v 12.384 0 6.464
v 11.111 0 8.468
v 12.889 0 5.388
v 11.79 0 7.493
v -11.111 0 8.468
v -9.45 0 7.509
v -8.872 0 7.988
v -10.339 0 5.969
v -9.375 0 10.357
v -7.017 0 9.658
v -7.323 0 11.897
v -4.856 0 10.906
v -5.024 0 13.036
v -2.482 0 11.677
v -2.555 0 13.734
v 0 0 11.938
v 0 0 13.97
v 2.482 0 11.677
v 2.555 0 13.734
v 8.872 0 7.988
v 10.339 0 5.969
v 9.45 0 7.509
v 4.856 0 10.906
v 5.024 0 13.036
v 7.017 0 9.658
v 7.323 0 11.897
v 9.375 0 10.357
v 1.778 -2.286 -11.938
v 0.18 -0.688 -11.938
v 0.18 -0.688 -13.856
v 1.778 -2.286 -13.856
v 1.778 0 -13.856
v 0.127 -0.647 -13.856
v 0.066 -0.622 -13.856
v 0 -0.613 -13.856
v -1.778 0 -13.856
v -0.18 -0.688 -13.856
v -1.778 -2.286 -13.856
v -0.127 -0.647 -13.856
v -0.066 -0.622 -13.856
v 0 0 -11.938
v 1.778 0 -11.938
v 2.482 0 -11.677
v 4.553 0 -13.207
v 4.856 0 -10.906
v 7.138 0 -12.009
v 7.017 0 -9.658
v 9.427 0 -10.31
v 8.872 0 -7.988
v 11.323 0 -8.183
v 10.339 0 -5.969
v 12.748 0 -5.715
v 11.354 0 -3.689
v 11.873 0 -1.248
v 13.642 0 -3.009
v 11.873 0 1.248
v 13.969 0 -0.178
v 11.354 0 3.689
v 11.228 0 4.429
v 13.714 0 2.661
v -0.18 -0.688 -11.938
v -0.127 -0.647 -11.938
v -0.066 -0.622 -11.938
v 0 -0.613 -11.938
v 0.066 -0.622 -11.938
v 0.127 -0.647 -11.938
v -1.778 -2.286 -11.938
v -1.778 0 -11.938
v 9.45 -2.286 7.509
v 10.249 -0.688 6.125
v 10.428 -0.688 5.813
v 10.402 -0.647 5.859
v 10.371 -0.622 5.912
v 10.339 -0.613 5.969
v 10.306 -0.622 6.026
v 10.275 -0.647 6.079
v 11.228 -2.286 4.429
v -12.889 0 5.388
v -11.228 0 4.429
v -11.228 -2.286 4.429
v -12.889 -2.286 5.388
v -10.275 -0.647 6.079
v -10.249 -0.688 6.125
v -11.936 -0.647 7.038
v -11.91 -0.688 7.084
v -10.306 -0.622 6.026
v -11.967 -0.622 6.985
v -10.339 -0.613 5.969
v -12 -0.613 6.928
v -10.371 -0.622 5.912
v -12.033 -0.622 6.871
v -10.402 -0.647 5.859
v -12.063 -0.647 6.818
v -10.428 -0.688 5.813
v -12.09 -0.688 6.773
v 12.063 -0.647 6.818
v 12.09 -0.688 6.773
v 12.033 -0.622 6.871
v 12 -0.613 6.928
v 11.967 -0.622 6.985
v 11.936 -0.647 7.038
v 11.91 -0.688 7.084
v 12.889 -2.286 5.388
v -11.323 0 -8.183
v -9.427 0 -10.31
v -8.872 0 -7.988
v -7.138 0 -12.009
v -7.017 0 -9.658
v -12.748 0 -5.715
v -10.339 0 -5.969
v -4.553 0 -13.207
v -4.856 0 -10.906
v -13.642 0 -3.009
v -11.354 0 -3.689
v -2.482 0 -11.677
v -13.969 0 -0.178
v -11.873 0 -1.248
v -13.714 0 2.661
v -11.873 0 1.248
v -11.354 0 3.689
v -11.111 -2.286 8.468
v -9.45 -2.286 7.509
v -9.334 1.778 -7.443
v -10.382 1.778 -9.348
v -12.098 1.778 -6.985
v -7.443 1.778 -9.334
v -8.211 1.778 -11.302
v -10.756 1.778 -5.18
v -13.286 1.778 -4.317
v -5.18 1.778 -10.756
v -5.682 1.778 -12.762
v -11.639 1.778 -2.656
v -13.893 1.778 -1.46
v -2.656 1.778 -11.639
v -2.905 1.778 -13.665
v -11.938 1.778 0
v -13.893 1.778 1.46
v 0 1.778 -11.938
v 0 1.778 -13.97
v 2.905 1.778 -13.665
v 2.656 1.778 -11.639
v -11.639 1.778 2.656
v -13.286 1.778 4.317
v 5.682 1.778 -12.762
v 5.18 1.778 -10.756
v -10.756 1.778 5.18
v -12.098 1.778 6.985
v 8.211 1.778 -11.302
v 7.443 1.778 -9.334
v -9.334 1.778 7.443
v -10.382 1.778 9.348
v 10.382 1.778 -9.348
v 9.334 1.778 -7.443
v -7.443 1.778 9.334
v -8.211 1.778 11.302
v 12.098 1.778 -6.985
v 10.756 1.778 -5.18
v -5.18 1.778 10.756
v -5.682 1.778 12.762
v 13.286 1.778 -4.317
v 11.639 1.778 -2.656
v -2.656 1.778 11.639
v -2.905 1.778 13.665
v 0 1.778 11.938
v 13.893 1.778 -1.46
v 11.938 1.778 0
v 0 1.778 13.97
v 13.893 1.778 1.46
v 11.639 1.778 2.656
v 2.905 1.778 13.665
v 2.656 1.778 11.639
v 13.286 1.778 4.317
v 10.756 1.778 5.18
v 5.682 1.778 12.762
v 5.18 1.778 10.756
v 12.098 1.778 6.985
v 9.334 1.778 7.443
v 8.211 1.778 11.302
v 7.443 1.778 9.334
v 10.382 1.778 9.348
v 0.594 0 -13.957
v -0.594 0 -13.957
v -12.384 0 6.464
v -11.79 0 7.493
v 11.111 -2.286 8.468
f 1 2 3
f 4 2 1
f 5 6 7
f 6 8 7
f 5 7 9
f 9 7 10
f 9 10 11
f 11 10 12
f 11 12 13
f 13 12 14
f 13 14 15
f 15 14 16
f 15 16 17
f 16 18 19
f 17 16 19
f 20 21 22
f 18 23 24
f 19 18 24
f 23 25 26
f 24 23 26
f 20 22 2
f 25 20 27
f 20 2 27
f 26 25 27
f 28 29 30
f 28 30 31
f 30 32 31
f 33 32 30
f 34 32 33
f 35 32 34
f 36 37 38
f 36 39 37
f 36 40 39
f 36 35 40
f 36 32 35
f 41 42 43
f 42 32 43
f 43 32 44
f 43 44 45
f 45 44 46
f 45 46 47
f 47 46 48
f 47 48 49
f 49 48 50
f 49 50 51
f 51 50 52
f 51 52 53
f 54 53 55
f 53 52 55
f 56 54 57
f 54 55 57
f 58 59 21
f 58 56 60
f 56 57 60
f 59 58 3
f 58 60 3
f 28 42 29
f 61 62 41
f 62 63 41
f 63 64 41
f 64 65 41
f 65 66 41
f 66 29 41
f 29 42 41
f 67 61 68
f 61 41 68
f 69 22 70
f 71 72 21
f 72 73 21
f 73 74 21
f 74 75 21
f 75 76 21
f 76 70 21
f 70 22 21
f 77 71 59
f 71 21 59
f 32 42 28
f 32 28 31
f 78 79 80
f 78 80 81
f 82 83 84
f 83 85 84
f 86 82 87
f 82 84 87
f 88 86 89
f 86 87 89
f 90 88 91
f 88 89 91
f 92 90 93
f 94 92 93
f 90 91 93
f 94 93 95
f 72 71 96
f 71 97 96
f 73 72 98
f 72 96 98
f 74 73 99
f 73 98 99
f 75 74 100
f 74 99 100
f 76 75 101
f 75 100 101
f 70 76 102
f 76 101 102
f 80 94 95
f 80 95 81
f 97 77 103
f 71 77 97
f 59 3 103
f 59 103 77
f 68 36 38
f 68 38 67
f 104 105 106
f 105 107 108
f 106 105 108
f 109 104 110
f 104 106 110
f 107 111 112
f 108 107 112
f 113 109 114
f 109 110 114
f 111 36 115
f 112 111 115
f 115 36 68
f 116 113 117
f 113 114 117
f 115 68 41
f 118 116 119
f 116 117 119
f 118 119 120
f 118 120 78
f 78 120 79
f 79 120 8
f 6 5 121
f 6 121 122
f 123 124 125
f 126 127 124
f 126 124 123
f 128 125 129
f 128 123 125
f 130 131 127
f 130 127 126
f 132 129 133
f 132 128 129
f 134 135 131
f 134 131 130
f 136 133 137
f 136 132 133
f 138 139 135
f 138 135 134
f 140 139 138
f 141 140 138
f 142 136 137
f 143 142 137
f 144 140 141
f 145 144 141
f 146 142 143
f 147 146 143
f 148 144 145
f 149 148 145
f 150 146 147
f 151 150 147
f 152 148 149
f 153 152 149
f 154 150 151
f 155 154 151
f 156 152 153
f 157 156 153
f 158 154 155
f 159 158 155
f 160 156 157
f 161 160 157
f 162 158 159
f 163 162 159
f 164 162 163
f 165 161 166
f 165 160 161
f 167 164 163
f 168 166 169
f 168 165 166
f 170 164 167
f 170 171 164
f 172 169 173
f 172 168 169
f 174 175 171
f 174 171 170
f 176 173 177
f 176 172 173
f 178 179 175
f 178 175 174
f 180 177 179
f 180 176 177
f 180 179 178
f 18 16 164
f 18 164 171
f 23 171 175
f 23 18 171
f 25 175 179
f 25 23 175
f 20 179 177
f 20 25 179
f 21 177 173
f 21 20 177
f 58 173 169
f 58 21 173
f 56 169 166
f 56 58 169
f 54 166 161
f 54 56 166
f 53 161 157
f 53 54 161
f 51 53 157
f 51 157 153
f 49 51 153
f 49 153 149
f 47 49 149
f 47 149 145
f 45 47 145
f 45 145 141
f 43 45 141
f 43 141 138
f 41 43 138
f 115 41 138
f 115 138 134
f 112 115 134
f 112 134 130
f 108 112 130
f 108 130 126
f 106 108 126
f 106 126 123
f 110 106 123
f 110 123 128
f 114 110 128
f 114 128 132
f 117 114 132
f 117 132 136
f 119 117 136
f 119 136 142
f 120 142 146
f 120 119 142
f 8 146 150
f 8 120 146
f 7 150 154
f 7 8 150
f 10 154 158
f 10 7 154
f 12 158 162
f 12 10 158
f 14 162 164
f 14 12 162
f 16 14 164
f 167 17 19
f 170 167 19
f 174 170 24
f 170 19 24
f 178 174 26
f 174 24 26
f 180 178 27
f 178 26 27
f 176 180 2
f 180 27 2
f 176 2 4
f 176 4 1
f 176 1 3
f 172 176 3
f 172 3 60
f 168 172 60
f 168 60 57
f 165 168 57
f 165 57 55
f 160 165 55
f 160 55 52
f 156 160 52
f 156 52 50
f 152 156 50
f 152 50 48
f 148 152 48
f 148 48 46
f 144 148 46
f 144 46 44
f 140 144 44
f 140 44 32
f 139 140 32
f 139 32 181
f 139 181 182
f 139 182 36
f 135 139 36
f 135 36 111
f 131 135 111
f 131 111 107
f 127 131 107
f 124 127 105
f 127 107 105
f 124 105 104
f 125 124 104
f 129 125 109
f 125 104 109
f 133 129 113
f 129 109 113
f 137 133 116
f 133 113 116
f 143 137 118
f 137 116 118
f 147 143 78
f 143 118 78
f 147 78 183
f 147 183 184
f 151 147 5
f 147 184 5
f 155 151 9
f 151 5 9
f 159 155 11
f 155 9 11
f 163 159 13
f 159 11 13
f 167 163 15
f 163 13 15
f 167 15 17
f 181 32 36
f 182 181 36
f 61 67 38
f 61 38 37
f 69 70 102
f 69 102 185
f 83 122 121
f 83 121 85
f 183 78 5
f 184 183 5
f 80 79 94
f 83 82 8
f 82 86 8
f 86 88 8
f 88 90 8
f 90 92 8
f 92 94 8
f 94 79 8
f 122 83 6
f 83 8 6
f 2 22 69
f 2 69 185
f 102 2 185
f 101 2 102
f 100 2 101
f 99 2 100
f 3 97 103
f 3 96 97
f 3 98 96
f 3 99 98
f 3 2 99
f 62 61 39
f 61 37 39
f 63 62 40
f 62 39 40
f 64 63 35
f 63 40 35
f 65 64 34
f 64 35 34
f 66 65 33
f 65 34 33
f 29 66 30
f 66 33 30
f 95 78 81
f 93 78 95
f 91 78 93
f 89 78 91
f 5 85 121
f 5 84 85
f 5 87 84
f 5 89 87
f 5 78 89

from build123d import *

# Parameters (mm, degrees)
SKETCH1_R                = 13.97
SKETCH1_R_2              = 11.938
BOSS_EXTRUDE1_DEPTH      = 1.778
BOSS_EXTRUDE2_DEPTH      = 2.286
CUT_EXTRUDE1_DEPTH       = 2.54
FILLET2_R                = 0.254
CIRPATTERN2_COUNT        = 3
FILLET2_OF_CIRPATTERN2_R = 0.254


with BuildPart() as part:
    # Sketch1 → Boss-Extrude1 (new body)
    with BuildSketch(Plane(origin=(0, 0, 0), x_dir=(1, 0, 0), z_dir=(0, 1, 0))):
        with Locations(Location((0, 0, 0), (0, 0, 270))):
            Circle(SKETCH1_R)
        with Locations(Location((0, 0, 0), (0, 0, 270))):
            Circle(SKETCH1_R_2, mode=Mode.SUBTRACT)
    extrude(amount=BOSS_EXTRUDE1_DEPTH)

    # Sketch3 → Boss-Extrude2 (add)
    with BuildSketch(Plane(origin=(0, 0, 0), x_dir=(-1, 0, 0), z_dir=(0, -1, 0))):
        Polygon((0, 11.938), (-1.778, 11.938), (-1.778, 13.856392604), (1.778, 13.856392604), (1.778, 11.938), align=None)
    boss_extrude2 = extrude(amount=BOSS_EXTRUDE2_DEPTH)

    # Sketch4 → Cut-Extrude1 (cut)
    with BuildSketch(Plane.XY.offset(-11.938)):
        Polygon((-1.778, -2.286), (0, -0.508), (1.778, -2.286), align=None)
    cut_extrude1 = extrude(amount=-CUT_EXTRUDE1_DEPTH, mode=Mode.SUBTRACT)

    # Fillet2
    fillet2_edges = [part.edges().sort_by_distance(p)[0] for p in [
        (0, -0.508, -12.897196302),
    ]]
    fillet(fillet2_edges, radius=FILLET2_R)

    # CirPattern2: Boss-Extrude2, Cut-Extrude1 ×3 about axis
    cirpattern2_axis = Axis((0, 0, 0), (0, 1, 0))
    add([boss_extrude2.rotate(cirpattern2_axis, i * 360 / CIRPATTERN2_COUNT) for i in range(1, CIRPATTERN2_COUNT)])
    add([cut_extrude1.rotate(cirpattern2_axis, i * 360 / CIRPATTERN2_COUNT) for i in range(1, CIRPATTERN2_COUNT)], mode=Mode.SUBTRACT)

    # Fillet2 of CirPattern2
    fillet2_of_cirpattern2_edges = [part.edges().sort_by_distance(p)[0] for p in [
        (-11.169299635, -0.508, 6.448598151),
        (11.169299635, -0.508, 6.448598151),
    ]]
    fillet(fillet2_of_cirpattern2_edges, radius=FILLET2_OF_CIRPATTERN2_R)


solid = part.part
